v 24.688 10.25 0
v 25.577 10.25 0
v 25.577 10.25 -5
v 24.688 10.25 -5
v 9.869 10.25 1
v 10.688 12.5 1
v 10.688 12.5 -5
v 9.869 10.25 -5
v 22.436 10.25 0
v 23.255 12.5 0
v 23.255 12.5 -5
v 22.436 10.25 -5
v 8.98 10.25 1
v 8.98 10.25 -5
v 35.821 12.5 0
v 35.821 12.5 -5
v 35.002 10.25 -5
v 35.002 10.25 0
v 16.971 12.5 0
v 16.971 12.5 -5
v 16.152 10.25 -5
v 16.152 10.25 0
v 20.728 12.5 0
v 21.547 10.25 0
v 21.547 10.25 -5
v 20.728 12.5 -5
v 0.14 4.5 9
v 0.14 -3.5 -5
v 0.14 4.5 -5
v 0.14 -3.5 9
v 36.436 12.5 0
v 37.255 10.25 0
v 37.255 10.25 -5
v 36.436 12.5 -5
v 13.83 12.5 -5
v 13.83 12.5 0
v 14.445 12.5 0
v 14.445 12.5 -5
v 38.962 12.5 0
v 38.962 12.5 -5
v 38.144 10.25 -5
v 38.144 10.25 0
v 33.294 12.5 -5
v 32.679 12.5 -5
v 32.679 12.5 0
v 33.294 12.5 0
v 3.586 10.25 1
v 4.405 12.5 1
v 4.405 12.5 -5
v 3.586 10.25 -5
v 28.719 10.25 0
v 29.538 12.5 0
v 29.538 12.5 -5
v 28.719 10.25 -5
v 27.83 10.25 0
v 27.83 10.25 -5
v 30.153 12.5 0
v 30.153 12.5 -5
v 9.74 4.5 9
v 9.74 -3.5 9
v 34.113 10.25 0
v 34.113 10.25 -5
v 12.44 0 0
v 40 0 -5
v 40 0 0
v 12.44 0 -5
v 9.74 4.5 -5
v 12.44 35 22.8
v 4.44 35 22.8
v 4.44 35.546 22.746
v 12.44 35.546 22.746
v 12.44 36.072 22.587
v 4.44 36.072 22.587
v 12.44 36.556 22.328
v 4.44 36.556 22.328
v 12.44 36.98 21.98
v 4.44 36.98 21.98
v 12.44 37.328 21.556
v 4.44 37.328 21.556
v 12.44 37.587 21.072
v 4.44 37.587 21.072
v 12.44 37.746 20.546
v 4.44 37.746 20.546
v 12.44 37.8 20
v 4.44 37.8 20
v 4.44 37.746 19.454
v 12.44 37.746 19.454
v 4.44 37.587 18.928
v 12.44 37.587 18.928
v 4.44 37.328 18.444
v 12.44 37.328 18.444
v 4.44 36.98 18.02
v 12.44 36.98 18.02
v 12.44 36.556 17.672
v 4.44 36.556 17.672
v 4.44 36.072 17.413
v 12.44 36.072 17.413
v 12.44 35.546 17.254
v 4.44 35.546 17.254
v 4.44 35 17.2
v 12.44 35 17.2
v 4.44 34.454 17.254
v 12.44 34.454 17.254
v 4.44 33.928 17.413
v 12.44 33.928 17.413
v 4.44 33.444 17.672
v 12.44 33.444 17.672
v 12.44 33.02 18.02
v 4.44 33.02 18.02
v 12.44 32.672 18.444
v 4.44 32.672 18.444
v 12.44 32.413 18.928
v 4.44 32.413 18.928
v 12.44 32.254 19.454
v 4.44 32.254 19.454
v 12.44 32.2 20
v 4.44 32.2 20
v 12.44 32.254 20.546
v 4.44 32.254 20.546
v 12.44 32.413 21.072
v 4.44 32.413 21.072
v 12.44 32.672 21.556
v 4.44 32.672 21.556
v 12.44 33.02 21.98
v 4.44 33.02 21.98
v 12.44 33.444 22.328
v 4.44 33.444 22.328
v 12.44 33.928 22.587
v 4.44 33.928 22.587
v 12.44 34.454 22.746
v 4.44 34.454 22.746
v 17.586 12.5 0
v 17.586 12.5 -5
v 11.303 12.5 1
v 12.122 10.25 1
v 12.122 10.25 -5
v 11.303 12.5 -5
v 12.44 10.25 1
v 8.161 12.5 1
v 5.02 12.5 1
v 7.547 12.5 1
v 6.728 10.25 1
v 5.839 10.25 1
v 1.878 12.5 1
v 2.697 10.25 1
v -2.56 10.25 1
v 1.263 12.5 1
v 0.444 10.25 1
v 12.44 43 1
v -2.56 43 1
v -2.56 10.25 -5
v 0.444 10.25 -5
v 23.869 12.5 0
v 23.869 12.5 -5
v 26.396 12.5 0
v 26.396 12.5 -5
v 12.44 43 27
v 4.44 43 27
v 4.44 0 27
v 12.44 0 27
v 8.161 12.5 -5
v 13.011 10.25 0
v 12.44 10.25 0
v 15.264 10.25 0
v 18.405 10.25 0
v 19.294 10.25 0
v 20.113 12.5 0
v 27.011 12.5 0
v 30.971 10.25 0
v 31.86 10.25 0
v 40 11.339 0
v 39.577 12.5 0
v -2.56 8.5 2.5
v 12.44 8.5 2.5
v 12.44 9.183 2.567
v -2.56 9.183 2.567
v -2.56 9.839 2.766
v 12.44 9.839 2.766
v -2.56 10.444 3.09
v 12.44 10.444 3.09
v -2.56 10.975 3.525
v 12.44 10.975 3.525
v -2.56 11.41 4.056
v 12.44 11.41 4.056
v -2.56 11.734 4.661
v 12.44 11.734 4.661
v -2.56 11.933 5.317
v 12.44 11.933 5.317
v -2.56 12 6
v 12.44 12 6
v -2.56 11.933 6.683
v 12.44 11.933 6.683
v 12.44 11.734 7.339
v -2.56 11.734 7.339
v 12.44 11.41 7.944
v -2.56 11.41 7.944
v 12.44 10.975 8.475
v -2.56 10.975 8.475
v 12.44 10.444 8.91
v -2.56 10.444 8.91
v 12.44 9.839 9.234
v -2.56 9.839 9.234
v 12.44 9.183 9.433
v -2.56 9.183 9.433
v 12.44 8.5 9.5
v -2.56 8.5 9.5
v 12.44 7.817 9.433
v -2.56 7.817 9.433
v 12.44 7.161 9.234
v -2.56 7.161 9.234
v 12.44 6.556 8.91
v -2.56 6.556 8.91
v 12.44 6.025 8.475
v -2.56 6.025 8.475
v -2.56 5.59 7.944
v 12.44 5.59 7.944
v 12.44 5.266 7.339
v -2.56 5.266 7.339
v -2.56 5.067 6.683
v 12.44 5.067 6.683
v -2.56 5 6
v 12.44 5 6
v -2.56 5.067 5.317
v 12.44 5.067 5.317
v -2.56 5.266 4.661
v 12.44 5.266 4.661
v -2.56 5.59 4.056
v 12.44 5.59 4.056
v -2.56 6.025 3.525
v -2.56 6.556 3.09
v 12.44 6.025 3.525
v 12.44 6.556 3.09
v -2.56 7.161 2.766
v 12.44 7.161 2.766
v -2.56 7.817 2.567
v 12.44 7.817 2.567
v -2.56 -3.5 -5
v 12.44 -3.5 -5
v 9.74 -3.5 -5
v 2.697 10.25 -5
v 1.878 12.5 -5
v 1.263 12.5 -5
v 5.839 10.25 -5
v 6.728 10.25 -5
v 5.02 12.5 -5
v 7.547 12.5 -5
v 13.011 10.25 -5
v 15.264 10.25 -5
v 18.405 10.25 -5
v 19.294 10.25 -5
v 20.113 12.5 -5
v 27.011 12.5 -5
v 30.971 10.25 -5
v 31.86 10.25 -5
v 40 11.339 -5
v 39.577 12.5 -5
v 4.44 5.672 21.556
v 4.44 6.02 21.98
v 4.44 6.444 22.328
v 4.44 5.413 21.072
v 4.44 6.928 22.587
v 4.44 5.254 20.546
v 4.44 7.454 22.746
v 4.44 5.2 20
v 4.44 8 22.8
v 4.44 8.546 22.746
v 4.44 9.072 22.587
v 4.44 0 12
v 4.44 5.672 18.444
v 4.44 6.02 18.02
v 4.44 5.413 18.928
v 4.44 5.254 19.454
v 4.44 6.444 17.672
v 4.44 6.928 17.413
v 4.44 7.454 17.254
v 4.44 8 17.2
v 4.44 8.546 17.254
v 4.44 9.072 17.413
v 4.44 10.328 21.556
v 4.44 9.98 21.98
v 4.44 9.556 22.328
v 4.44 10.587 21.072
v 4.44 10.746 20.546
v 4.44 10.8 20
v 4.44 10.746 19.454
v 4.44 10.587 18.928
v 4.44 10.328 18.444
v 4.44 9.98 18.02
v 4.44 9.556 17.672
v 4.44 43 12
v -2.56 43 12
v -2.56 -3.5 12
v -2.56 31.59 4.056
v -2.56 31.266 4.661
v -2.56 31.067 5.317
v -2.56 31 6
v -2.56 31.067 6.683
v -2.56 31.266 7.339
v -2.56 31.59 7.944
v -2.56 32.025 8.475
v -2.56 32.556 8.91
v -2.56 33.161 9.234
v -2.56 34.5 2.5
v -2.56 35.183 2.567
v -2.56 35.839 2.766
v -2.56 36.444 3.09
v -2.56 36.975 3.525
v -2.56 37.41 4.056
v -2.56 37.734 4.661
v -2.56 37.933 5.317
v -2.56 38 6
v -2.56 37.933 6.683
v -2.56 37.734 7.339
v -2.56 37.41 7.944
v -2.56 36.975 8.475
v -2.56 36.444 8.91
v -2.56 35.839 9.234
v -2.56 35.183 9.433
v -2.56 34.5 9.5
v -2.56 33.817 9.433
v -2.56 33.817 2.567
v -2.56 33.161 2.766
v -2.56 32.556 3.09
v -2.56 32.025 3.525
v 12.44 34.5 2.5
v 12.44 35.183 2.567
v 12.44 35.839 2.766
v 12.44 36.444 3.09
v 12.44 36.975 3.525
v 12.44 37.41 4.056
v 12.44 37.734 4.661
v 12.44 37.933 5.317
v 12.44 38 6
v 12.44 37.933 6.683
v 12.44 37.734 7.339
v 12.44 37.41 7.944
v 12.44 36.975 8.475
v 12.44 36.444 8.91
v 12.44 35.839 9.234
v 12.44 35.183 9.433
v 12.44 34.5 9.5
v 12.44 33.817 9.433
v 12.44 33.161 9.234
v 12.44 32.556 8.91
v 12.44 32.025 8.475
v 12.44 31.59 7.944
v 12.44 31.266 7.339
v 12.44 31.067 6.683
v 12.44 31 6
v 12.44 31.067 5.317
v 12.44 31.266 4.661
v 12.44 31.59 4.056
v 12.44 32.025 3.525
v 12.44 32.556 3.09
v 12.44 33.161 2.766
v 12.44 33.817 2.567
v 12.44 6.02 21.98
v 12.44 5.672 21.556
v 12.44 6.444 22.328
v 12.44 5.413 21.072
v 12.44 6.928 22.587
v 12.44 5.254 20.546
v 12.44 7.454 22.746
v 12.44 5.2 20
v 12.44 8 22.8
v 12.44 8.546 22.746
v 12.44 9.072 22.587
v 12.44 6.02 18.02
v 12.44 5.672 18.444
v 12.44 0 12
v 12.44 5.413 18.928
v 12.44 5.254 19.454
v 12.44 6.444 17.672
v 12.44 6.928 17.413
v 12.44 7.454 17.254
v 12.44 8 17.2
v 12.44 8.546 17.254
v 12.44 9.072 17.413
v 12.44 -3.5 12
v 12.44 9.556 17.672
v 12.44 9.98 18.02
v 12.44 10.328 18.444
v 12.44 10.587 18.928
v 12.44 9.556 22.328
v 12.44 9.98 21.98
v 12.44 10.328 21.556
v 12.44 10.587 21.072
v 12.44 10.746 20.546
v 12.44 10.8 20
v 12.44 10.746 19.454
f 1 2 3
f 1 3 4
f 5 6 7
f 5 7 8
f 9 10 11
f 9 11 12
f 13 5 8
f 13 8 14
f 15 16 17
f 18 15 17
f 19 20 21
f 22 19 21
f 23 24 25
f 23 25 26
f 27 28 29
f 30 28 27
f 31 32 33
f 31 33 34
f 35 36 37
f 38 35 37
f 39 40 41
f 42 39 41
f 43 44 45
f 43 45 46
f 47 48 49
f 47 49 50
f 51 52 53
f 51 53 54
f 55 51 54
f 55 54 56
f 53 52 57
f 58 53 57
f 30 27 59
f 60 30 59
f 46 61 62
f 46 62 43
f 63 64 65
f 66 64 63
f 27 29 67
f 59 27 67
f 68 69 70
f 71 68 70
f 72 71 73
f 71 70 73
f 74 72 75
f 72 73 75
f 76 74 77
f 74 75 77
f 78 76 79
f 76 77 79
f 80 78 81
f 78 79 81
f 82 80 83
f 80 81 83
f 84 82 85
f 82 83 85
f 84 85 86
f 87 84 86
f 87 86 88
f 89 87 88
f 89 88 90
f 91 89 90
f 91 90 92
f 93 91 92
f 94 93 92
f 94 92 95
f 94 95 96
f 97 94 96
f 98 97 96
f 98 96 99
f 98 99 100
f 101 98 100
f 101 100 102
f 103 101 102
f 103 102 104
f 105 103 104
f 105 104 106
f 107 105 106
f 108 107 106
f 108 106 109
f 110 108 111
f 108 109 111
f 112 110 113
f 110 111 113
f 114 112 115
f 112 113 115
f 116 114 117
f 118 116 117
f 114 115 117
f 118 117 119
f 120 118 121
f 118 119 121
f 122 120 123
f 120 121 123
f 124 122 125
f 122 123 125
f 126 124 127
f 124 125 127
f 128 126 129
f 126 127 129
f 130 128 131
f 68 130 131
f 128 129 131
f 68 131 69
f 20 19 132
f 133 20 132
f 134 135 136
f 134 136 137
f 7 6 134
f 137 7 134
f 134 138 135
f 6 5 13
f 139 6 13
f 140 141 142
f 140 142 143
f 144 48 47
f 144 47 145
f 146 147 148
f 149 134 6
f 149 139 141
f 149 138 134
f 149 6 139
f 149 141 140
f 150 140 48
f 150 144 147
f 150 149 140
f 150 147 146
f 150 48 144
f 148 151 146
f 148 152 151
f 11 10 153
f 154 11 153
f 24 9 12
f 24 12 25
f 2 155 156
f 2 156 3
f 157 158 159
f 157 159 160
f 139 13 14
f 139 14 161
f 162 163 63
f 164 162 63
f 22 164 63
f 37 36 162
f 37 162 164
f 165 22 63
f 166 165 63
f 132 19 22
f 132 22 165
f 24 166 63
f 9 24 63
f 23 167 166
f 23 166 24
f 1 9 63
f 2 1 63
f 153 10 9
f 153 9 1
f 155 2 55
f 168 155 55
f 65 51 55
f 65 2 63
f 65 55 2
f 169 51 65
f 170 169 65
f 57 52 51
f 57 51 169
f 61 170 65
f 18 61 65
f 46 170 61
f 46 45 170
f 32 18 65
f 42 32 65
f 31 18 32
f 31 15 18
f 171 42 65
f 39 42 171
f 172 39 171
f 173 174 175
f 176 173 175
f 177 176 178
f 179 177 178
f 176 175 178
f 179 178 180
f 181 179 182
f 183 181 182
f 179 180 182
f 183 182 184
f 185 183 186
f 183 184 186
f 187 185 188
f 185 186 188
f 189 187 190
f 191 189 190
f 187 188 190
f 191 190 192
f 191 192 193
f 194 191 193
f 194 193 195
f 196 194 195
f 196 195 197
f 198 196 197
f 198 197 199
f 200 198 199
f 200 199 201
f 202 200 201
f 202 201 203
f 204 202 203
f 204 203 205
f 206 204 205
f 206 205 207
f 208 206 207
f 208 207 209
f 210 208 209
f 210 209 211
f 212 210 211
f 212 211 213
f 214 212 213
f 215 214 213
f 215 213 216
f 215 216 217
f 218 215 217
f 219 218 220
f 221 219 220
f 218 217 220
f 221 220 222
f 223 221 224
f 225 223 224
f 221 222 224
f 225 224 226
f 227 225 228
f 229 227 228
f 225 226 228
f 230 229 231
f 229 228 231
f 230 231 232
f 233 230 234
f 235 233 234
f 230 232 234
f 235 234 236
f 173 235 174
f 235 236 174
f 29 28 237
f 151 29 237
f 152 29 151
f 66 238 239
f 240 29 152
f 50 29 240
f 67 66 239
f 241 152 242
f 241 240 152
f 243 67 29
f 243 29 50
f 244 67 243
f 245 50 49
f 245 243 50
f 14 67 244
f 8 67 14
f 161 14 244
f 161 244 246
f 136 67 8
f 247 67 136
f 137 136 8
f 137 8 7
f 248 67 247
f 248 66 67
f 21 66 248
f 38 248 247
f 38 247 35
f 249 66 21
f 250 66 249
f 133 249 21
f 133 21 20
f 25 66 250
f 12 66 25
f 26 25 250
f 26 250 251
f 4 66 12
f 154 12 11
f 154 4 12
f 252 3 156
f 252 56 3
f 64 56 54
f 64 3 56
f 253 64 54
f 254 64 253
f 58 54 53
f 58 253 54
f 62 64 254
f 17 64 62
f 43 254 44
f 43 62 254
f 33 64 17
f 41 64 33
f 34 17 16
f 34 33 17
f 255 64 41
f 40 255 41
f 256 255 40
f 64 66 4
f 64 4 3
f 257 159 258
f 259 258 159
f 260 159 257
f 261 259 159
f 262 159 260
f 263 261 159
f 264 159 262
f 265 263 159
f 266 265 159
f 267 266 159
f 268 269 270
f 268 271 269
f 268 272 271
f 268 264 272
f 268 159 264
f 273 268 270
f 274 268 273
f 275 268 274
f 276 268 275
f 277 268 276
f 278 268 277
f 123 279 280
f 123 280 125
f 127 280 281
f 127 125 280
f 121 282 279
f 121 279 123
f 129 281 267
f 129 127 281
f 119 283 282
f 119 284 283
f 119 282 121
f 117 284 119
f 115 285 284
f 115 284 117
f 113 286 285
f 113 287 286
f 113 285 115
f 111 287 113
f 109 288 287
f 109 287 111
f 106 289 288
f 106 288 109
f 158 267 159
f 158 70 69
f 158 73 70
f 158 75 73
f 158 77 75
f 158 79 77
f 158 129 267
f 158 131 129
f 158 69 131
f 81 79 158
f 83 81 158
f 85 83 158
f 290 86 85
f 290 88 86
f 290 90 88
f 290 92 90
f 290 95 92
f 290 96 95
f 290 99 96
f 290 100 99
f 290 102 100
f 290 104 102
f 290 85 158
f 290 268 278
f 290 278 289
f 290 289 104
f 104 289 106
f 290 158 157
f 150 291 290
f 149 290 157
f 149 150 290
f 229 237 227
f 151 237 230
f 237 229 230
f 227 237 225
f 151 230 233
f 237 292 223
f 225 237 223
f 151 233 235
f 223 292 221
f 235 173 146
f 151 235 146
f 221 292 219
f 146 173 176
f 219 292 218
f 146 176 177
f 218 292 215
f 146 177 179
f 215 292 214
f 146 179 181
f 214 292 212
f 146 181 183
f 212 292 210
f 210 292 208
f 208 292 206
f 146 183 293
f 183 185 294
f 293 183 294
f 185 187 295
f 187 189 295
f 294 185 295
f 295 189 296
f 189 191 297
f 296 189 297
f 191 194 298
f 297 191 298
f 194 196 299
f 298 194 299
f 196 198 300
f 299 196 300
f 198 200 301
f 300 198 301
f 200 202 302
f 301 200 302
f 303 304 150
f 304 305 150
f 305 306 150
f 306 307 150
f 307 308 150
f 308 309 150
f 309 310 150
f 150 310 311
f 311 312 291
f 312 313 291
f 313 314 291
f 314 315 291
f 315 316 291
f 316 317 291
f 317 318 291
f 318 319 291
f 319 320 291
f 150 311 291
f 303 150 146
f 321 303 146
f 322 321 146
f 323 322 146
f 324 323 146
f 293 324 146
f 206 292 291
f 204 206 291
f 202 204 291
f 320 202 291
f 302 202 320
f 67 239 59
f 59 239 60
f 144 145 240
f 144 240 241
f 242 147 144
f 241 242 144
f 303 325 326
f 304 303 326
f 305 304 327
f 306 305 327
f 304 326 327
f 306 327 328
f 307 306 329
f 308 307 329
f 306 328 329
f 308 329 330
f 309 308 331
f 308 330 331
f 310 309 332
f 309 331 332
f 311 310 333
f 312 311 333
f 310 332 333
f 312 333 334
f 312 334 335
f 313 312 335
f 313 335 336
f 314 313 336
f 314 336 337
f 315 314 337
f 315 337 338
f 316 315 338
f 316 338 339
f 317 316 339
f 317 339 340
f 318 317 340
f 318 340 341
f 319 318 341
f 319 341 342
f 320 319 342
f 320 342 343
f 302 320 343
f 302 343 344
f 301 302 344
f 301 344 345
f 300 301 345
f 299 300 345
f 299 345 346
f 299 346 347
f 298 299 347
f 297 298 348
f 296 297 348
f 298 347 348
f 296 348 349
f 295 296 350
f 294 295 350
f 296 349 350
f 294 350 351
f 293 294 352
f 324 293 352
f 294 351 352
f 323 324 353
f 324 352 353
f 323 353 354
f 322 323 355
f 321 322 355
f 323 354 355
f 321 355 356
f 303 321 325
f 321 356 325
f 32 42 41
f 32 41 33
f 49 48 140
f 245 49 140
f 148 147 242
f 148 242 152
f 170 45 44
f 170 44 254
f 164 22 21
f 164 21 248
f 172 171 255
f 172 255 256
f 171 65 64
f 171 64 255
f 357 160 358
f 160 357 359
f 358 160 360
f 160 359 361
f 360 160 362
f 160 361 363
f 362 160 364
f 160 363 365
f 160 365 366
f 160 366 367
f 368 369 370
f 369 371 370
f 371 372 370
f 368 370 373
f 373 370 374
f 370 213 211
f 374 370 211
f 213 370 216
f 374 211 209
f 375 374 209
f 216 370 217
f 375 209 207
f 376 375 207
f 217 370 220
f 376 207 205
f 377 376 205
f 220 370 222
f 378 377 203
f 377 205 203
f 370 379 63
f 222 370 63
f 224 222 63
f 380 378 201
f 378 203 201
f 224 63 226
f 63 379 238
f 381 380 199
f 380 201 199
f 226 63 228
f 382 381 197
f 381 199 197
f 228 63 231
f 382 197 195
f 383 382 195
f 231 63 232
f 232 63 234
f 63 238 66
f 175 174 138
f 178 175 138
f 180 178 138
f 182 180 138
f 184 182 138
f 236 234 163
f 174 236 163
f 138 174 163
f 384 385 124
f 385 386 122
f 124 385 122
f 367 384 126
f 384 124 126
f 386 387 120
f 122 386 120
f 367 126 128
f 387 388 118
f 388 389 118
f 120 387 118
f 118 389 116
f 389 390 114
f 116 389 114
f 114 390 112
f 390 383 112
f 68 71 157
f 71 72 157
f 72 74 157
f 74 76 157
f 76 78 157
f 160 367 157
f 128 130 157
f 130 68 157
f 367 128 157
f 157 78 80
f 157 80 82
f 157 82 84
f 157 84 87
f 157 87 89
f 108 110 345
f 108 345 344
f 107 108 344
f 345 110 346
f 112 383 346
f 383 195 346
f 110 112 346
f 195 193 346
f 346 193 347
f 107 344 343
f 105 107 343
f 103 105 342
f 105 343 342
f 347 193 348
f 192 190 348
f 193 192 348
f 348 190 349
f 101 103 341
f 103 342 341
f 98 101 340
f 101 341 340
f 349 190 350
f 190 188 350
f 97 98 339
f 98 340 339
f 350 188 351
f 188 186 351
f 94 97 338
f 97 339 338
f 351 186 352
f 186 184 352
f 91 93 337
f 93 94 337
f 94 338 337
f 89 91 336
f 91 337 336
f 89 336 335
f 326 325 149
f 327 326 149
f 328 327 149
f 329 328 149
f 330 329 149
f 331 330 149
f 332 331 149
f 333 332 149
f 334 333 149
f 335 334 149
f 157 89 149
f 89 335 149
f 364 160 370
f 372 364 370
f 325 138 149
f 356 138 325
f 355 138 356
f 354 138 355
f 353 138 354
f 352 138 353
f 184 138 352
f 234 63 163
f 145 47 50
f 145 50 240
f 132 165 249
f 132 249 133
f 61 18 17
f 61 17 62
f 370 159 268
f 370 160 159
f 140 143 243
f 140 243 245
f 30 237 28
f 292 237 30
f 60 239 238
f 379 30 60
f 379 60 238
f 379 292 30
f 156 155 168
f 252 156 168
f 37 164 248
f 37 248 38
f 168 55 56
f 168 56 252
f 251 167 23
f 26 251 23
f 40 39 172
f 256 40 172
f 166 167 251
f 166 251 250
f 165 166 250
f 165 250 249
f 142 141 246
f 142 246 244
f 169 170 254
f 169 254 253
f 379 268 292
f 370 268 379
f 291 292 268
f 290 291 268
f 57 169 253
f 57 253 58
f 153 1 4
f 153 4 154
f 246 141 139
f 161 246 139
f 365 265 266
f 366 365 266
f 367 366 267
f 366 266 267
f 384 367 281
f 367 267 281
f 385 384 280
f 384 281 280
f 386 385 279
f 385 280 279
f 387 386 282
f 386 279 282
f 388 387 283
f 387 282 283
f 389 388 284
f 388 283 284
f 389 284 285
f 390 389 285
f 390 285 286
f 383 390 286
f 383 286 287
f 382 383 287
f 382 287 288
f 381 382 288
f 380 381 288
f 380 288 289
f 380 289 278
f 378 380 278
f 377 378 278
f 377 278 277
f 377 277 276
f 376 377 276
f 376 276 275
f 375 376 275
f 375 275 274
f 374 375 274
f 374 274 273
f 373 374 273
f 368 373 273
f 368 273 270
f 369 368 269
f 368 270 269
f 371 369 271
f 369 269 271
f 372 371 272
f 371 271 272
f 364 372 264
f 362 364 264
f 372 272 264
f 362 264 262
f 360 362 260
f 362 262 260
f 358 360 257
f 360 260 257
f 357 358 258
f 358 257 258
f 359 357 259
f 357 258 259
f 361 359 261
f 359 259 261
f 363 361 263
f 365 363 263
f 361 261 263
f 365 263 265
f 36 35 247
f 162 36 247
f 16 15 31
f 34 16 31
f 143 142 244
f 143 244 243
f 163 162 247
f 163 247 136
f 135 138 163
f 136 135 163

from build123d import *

# Parameters (mm, degrees)
BLANKSKE_W                 = 40
BLANKSKE_H                 = 12.5
BLANK_DEPTH                = 5
TOOTHCUTSIM_DEPTH          = 43.20485754
TEETHCUTS_COUNT            = 14
TEETHCUTS_PITCH            = 3.14159265
MOVE_FACE1_BY              = 0.44
SKETCH1_W                  = 15
SKETCH1_H                  = 43
BOSS_EXTRUDE1_DEPTH        = 12
F_7_0_7_DIAMETER_HOLE1_D   = 7
SKETCH6_W                  = 2.7
SKETCH6_H                  = 17
BOSS_EXTRUDE2_DEPTH        = 3.5
SKETCH7_W                  = 8
SKETCH7_H                  = 43
BOSS_EXTRUDE3_DEPTH        = 15
F_5_6_5_6_DIAMETER_HOLE1_D = 5.6
MOVE_FACE2_BY              = 3
SKETCH11_W                 = 9.6
SKETCH11_H                 = 14
CUT_EXTRUDE2_DEPTH         = 4.5
SKETCH12_W                 = 9.6
SKETCH12_H                 = 3
BOSS_EXTRUDE4_DEPTH        = 3.5
MOVE_FACE3_BY              = 1


with BuildPart() as part:
    # BlankSke → Blank (new body)
    with BuildSketch(Plane.XY):
        with Locations((20, 6.25)):
            Rectangle(BLANKSKE_W, BLANKSKE_H)
    extrude(amount=-BLANK_DEPTH)

    # TooCutSkeSim → ToothCutSim (cut, through all)
    with BuildSketch(Plane.XY):
        Polygon((0.44443537, 10.25), (-0.44443537, 10.25), (-1.272613241, 12.5254), (1.272613241, 12.5254), align=None)
    toothcutsim = extrude(amount=-TOOTHCUTSIM_DEPTH, mode=Mode.SUBTRACT)

    # TeethCuts: ToothCutSim ×14
    with Locations(*[(i * TEETHCUTS_PITCH, 0, 0) for i in range(1, TEETHCUTS_COUNT)]):
        add(toothcutsim, mode=Mode.SUBTRACT)

    # Move Face1: a face moved inward by 0.44
    extrude(part.faces().sort_by_distance((0, 5.125, -2.5))[0], amount=MOVE_FACE1_BY, dir=(1, 0, 0), mode=Mode.SUBTRACT)

    # Sketch1 → Boss-Extrude1 (add)
    with BuildSketch(Plane(origin=(0, 0, 0), x_dir=(-1, 0, 0), z_dir=(0, 0, -1))):
        with Locations((-4.94, 21.5)):
            Rectangle(SKETCH1_W, SKETCH1_H)
    extrude(amount=-BOSS_EXTRUDE1_DEPTH)

    # Ø7.0 (7) Diameter Hole1 (through all)
    with Locations(Plane.ZY.offset(2.56)):
        with Locations((6, 34.5), (6, 8.5)):
            Hole(F_7_0_7_DIAMETER_HOLE1_D / 2)

    # Sketch6 → Boss-Extrude2 (add)
    with BuildSketch(Plane.XZ):
        with Locations((-1.21, 3.5)):
            Rectangle(SKETCH6_W, SKETCH6_H)
        with Locations((11.09, 3.5)):
            Rectangle(SKETCH6_W, SKETCH6_H)
    extrude(amount=BOSS_EXTRUDE2_DEPTH)

    # Sketch7 → Boss-Extrude3 (add)
    with BuildSketch(Plane.XY.offset(12)):
        with Locations((8.44, 21.5)):
            Rectangle(SKETCH7_W, SKETCH7_H)
    extrude(amount=BOSS_EXTRUDE3_DEPTH)

    # Ø5.6 (5.6) Diameter Hole1 (through all)
    with Locations(Plane(origin=(12.44, 0, 0), x_dir=(0, 0, -1), z_dir=(1, 0, 0))):
        with Locations((-20, 35), (-20, 8)):
            Hole(F_5_6_5_6_DIAMETER_HOLE1_D / 2)

    # Move Face2: a face moved outward by 3.0
    extrude(part.faces().sort_by_distance((0.44, 5.125, -2.5))[0], amount=MOVE_FACE2_BY, dir=(-1, 0, 0))

    # Sketch11 → Cut-Extrude2 (cut)
    with BuildSketch(Plane.XZ):
        with Locations((4.94, 2)):
            Rectangle(SKETCH11_W, SKETCH11_H)
    extrude(amount=-CUT_EXTRUDE2_DEPTH, mode=Mode.SUBTRACT)

    # Sketch12 → Boss-Extrude4 (add)
    with BuildSketch(Plane.XZ):
        with Locations((4.94, 10.5)):
            Rectangle(SKETCH12_W, SKETCH12_H)
    extrude(amount=BOSS_EXTRUDE4_DEPTH)

    # Move Face3: a face moved inward by 1.0
    extrude(part.faces().sort_by_distance((4.903765557, 27.042169716, 0))[0], amount=MOVE_FACE3_BY, dir=(0, 0, 1), mode=Mode.SUBTRACT)


solid = part.part
